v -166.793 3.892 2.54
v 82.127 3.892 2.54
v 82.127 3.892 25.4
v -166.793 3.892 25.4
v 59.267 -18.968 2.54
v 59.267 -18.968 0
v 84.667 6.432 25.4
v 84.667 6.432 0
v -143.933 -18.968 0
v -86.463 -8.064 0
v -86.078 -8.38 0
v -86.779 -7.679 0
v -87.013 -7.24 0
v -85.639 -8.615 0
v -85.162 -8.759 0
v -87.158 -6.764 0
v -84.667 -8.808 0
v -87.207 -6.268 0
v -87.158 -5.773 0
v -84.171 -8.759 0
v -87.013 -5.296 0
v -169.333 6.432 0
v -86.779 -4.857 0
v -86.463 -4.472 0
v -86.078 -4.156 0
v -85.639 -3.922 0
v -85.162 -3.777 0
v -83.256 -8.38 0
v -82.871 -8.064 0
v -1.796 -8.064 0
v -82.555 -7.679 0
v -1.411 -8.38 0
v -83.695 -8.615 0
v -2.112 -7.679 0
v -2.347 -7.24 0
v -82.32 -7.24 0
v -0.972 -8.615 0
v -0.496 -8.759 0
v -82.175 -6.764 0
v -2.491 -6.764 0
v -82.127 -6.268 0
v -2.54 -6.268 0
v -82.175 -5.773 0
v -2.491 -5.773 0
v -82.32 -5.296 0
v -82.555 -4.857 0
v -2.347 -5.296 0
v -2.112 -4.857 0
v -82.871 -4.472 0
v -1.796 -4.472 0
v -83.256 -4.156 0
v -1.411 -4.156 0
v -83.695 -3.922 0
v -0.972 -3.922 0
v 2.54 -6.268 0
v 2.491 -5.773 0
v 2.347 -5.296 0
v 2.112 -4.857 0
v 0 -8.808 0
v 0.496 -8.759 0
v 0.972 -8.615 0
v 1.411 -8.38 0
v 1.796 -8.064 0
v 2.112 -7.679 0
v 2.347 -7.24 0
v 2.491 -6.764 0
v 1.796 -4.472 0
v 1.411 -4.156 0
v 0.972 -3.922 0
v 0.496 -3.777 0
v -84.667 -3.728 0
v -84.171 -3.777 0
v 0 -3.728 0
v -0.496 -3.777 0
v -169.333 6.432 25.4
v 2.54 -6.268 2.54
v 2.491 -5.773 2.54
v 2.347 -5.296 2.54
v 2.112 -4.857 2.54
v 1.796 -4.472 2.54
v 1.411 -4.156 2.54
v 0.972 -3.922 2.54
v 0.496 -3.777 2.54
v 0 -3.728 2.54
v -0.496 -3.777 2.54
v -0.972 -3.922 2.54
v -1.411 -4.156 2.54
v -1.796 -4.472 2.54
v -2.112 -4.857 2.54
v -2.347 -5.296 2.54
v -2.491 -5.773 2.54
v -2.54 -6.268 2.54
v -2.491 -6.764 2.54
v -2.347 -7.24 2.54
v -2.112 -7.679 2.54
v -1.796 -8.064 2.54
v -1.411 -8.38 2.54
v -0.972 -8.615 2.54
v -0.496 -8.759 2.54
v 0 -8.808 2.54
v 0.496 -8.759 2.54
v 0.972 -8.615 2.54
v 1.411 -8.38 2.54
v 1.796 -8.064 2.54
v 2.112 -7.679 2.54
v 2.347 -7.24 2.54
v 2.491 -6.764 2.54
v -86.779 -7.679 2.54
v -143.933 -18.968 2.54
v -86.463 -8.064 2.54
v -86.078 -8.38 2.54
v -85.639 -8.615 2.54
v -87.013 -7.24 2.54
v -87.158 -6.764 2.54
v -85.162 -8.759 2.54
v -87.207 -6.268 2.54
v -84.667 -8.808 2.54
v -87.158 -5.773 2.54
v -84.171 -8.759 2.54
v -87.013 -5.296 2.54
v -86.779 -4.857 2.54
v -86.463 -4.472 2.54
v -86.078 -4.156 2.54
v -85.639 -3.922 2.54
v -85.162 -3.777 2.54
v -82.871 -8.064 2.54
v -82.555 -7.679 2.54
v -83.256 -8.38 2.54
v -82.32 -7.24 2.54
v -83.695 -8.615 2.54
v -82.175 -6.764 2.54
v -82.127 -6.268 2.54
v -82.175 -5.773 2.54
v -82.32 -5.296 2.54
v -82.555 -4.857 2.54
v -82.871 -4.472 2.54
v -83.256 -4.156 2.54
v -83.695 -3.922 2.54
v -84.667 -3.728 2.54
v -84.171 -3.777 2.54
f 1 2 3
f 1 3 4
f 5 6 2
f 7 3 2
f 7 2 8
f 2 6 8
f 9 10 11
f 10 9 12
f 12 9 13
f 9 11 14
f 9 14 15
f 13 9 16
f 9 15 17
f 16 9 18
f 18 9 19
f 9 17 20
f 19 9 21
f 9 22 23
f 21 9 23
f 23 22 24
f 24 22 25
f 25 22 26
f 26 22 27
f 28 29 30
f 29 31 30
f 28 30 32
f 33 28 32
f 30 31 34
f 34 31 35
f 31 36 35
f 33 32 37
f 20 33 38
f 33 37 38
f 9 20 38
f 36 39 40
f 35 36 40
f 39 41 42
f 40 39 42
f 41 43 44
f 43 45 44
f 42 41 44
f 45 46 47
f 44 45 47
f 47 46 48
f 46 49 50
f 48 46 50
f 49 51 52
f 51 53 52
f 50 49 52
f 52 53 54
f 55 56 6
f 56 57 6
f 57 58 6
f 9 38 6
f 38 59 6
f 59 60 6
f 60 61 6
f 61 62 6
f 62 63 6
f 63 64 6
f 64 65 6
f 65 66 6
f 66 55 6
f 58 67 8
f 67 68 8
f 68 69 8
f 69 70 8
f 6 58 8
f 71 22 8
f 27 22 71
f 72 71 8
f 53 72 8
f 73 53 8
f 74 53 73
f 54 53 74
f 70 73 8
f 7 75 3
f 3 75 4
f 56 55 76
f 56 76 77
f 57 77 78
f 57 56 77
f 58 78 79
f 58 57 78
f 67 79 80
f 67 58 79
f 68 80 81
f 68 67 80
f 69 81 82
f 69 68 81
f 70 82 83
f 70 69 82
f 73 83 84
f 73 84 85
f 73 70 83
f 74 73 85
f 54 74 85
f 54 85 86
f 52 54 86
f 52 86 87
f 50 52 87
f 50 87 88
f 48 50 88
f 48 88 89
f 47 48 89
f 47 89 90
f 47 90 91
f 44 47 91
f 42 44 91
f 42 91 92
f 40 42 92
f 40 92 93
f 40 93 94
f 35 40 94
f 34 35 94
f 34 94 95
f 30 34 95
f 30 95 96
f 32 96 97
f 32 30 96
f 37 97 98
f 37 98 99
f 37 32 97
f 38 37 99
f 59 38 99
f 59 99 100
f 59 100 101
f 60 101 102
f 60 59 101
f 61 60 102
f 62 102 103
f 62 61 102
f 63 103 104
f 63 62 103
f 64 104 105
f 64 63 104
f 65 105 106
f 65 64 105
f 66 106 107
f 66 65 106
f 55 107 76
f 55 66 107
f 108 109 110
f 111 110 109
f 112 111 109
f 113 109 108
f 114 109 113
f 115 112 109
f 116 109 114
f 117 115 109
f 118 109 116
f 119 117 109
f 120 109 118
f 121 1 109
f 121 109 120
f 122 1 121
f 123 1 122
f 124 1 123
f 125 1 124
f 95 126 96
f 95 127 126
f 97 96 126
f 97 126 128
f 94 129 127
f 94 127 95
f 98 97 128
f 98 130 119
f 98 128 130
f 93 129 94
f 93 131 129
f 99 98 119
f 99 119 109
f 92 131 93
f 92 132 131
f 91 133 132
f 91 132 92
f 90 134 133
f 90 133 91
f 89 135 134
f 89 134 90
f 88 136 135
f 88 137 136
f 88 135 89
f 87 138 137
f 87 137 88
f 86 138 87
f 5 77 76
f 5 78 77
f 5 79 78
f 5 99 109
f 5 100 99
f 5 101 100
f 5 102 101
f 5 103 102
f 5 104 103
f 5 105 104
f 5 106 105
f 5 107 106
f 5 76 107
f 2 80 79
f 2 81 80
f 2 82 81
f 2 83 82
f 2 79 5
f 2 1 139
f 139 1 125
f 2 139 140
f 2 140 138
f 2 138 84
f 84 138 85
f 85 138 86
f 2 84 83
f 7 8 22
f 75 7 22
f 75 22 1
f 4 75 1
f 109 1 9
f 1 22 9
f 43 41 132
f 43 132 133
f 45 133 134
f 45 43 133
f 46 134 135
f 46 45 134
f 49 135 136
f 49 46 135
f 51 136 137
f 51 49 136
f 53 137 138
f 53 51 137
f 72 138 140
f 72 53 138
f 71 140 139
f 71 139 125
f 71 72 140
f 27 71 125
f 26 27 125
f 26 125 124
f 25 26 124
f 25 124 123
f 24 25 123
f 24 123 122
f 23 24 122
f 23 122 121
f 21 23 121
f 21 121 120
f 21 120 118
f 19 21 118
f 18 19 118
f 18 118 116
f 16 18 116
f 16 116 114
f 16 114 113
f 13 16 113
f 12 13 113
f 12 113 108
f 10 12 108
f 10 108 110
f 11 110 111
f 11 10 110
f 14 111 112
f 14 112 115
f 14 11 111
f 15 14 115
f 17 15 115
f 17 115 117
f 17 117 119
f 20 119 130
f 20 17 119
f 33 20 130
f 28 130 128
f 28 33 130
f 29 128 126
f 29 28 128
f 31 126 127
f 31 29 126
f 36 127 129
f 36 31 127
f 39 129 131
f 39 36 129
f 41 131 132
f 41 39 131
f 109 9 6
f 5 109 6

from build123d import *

# Parameters (mm, degrees)
F0_R     = 2.54
F1_DEPTH = 25.4
F2_T     = -2.54


# Not quite as in the source:
# - a feature names something its author has since deleted; it is built from what else it names


with BuildPart() as f1:
    # F0 (on Top) → F1 (new body)
    with BuildSketch(Plane.XY):
        Polygon((84.6666666667, 6.4318103081), (-169.3333333333, 6.4318103081), (-143.9333333333, -18.9681896919), (59.2666666667, -18.9681896919), align=None)
        with Locations((-84.6666666667, -6.2681896919)):
            Circle(F0_R, mode=Mode.SUBTRACT)
        with Locations((0, -6.2681896919)):
            Circle(F0_R, mode=Mode.SUBTRACT)
    extrude(amount=F1_DEPTH)

    # F2
    f2_openings = [f1.faces().sort_by_distance(p)[0] for p in [
        (71.966667, -6.26819, 12.7),
        (-156.633333, -6.26819, 12.7),
        (-42.333333, -18.96819, 12.7),
        (-42.333333, -5.794512, 25.4),
        (-87.206667, -6.26819, 12.7),
        (-2.54, -6.26819, 12.7),
    ]]
    offset(amount=F2_T, openings=f2_openings)


solid = f1.part
